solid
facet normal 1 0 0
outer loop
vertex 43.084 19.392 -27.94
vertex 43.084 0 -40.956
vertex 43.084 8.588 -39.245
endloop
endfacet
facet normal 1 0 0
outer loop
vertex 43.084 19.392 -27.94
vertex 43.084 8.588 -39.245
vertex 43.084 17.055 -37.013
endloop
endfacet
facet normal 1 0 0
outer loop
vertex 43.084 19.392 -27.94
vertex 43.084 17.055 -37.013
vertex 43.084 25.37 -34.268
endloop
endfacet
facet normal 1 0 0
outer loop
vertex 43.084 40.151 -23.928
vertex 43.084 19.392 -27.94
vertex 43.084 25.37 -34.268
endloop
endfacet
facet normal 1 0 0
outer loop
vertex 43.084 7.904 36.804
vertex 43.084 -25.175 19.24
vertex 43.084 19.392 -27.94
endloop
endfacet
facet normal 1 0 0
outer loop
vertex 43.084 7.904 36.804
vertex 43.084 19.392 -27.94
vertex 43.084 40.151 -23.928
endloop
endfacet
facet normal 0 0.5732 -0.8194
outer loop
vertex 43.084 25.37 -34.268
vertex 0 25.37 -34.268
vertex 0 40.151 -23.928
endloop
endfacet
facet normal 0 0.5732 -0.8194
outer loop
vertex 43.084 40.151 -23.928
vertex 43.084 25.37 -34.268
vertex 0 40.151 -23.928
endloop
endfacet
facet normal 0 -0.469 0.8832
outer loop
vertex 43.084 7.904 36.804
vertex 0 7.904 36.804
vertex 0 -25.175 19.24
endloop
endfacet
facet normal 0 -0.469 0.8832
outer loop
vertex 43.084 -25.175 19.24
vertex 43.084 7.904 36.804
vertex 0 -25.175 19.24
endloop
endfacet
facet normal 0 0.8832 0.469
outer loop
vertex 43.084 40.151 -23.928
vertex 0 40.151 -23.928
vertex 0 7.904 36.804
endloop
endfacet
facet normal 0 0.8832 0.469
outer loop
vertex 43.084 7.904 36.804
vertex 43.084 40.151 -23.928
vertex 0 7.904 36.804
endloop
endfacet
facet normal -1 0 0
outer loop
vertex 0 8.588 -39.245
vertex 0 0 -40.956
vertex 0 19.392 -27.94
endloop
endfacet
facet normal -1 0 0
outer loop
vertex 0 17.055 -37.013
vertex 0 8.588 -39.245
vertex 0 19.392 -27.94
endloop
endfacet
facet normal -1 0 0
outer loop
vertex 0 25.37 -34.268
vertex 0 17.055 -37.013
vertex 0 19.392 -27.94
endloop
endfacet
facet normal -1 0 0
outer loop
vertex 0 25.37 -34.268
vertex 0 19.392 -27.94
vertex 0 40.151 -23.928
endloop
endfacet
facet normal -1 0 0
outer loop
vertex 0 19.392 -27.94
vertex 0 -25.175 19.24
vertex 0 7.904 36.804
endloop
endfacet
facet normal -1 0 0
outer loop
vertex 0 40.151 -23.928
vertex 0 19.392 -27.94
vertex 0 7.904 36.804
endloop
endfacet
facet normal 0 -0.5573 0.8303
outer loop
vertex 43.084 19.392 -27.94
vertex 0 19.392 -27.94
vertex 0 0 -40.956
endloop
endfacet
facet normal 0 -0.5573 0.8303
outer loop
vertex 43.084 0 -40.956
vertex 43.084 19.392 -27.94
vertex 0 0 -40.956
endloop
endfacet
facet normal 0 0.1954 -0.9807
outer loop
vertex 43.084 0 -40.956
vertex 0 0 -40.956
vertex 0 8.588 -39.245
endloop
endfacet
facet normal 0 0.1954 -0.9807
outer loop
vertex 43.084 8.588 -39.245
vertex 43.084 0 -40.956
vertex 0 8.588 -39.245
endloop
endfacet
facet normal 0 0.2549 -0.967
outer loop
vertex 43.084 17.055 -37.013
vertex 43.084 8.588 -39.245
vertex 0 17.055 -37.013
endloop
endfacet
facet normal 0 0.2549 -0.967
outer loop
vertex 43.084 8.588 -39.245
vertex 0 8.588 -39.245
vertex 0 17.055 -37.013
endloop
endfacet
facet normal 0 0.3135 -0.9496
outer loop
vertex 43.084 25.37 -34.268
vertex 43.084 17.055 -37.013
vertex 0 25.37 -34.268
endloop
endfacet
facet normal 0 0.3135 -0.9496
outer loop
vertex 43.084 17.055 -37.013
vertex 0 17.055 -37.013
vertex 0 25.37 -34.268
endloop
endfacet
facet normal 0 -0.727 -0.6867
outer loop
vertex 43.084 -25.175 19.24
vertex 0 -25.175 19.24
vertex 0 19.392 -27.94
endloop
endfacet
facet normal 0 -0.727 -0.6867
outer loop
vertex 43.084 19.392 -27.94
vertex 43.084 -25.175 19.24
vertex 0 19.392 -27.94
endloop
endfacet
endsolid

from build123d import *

# Parameters (mm, degrees)
F1_DEPTH = 43.084349


with BuildPart() as f1:
    # F0 (on Right) → F1 (new body)
    with BuildSketch(Plane.YZ):
        with BuildLine():
            ThreePointArc((0, -40.956058), (12.838283, -38.193702), (25.369942, -34.268193))
            Line((25.369942, -34.268193), (19.392215, -27.939987))
            Line((19.392215, -27.939987), (0, -40.956058))
        make_face()
        Polygon((19.392215, -27.939987), (25.369942, -34.268193), (40.151024, -23.927731), (25.369942, -23.927731), align=None)
        Polygon((-25.174692, 19.239914), (19.392215, -27.939987), (25.369942, -23.927731), (40.151024, -23.927731), (7.903695, 36.803901), align=None)
    extrude(amount=F1_DEPTH)


solid = f1.part
